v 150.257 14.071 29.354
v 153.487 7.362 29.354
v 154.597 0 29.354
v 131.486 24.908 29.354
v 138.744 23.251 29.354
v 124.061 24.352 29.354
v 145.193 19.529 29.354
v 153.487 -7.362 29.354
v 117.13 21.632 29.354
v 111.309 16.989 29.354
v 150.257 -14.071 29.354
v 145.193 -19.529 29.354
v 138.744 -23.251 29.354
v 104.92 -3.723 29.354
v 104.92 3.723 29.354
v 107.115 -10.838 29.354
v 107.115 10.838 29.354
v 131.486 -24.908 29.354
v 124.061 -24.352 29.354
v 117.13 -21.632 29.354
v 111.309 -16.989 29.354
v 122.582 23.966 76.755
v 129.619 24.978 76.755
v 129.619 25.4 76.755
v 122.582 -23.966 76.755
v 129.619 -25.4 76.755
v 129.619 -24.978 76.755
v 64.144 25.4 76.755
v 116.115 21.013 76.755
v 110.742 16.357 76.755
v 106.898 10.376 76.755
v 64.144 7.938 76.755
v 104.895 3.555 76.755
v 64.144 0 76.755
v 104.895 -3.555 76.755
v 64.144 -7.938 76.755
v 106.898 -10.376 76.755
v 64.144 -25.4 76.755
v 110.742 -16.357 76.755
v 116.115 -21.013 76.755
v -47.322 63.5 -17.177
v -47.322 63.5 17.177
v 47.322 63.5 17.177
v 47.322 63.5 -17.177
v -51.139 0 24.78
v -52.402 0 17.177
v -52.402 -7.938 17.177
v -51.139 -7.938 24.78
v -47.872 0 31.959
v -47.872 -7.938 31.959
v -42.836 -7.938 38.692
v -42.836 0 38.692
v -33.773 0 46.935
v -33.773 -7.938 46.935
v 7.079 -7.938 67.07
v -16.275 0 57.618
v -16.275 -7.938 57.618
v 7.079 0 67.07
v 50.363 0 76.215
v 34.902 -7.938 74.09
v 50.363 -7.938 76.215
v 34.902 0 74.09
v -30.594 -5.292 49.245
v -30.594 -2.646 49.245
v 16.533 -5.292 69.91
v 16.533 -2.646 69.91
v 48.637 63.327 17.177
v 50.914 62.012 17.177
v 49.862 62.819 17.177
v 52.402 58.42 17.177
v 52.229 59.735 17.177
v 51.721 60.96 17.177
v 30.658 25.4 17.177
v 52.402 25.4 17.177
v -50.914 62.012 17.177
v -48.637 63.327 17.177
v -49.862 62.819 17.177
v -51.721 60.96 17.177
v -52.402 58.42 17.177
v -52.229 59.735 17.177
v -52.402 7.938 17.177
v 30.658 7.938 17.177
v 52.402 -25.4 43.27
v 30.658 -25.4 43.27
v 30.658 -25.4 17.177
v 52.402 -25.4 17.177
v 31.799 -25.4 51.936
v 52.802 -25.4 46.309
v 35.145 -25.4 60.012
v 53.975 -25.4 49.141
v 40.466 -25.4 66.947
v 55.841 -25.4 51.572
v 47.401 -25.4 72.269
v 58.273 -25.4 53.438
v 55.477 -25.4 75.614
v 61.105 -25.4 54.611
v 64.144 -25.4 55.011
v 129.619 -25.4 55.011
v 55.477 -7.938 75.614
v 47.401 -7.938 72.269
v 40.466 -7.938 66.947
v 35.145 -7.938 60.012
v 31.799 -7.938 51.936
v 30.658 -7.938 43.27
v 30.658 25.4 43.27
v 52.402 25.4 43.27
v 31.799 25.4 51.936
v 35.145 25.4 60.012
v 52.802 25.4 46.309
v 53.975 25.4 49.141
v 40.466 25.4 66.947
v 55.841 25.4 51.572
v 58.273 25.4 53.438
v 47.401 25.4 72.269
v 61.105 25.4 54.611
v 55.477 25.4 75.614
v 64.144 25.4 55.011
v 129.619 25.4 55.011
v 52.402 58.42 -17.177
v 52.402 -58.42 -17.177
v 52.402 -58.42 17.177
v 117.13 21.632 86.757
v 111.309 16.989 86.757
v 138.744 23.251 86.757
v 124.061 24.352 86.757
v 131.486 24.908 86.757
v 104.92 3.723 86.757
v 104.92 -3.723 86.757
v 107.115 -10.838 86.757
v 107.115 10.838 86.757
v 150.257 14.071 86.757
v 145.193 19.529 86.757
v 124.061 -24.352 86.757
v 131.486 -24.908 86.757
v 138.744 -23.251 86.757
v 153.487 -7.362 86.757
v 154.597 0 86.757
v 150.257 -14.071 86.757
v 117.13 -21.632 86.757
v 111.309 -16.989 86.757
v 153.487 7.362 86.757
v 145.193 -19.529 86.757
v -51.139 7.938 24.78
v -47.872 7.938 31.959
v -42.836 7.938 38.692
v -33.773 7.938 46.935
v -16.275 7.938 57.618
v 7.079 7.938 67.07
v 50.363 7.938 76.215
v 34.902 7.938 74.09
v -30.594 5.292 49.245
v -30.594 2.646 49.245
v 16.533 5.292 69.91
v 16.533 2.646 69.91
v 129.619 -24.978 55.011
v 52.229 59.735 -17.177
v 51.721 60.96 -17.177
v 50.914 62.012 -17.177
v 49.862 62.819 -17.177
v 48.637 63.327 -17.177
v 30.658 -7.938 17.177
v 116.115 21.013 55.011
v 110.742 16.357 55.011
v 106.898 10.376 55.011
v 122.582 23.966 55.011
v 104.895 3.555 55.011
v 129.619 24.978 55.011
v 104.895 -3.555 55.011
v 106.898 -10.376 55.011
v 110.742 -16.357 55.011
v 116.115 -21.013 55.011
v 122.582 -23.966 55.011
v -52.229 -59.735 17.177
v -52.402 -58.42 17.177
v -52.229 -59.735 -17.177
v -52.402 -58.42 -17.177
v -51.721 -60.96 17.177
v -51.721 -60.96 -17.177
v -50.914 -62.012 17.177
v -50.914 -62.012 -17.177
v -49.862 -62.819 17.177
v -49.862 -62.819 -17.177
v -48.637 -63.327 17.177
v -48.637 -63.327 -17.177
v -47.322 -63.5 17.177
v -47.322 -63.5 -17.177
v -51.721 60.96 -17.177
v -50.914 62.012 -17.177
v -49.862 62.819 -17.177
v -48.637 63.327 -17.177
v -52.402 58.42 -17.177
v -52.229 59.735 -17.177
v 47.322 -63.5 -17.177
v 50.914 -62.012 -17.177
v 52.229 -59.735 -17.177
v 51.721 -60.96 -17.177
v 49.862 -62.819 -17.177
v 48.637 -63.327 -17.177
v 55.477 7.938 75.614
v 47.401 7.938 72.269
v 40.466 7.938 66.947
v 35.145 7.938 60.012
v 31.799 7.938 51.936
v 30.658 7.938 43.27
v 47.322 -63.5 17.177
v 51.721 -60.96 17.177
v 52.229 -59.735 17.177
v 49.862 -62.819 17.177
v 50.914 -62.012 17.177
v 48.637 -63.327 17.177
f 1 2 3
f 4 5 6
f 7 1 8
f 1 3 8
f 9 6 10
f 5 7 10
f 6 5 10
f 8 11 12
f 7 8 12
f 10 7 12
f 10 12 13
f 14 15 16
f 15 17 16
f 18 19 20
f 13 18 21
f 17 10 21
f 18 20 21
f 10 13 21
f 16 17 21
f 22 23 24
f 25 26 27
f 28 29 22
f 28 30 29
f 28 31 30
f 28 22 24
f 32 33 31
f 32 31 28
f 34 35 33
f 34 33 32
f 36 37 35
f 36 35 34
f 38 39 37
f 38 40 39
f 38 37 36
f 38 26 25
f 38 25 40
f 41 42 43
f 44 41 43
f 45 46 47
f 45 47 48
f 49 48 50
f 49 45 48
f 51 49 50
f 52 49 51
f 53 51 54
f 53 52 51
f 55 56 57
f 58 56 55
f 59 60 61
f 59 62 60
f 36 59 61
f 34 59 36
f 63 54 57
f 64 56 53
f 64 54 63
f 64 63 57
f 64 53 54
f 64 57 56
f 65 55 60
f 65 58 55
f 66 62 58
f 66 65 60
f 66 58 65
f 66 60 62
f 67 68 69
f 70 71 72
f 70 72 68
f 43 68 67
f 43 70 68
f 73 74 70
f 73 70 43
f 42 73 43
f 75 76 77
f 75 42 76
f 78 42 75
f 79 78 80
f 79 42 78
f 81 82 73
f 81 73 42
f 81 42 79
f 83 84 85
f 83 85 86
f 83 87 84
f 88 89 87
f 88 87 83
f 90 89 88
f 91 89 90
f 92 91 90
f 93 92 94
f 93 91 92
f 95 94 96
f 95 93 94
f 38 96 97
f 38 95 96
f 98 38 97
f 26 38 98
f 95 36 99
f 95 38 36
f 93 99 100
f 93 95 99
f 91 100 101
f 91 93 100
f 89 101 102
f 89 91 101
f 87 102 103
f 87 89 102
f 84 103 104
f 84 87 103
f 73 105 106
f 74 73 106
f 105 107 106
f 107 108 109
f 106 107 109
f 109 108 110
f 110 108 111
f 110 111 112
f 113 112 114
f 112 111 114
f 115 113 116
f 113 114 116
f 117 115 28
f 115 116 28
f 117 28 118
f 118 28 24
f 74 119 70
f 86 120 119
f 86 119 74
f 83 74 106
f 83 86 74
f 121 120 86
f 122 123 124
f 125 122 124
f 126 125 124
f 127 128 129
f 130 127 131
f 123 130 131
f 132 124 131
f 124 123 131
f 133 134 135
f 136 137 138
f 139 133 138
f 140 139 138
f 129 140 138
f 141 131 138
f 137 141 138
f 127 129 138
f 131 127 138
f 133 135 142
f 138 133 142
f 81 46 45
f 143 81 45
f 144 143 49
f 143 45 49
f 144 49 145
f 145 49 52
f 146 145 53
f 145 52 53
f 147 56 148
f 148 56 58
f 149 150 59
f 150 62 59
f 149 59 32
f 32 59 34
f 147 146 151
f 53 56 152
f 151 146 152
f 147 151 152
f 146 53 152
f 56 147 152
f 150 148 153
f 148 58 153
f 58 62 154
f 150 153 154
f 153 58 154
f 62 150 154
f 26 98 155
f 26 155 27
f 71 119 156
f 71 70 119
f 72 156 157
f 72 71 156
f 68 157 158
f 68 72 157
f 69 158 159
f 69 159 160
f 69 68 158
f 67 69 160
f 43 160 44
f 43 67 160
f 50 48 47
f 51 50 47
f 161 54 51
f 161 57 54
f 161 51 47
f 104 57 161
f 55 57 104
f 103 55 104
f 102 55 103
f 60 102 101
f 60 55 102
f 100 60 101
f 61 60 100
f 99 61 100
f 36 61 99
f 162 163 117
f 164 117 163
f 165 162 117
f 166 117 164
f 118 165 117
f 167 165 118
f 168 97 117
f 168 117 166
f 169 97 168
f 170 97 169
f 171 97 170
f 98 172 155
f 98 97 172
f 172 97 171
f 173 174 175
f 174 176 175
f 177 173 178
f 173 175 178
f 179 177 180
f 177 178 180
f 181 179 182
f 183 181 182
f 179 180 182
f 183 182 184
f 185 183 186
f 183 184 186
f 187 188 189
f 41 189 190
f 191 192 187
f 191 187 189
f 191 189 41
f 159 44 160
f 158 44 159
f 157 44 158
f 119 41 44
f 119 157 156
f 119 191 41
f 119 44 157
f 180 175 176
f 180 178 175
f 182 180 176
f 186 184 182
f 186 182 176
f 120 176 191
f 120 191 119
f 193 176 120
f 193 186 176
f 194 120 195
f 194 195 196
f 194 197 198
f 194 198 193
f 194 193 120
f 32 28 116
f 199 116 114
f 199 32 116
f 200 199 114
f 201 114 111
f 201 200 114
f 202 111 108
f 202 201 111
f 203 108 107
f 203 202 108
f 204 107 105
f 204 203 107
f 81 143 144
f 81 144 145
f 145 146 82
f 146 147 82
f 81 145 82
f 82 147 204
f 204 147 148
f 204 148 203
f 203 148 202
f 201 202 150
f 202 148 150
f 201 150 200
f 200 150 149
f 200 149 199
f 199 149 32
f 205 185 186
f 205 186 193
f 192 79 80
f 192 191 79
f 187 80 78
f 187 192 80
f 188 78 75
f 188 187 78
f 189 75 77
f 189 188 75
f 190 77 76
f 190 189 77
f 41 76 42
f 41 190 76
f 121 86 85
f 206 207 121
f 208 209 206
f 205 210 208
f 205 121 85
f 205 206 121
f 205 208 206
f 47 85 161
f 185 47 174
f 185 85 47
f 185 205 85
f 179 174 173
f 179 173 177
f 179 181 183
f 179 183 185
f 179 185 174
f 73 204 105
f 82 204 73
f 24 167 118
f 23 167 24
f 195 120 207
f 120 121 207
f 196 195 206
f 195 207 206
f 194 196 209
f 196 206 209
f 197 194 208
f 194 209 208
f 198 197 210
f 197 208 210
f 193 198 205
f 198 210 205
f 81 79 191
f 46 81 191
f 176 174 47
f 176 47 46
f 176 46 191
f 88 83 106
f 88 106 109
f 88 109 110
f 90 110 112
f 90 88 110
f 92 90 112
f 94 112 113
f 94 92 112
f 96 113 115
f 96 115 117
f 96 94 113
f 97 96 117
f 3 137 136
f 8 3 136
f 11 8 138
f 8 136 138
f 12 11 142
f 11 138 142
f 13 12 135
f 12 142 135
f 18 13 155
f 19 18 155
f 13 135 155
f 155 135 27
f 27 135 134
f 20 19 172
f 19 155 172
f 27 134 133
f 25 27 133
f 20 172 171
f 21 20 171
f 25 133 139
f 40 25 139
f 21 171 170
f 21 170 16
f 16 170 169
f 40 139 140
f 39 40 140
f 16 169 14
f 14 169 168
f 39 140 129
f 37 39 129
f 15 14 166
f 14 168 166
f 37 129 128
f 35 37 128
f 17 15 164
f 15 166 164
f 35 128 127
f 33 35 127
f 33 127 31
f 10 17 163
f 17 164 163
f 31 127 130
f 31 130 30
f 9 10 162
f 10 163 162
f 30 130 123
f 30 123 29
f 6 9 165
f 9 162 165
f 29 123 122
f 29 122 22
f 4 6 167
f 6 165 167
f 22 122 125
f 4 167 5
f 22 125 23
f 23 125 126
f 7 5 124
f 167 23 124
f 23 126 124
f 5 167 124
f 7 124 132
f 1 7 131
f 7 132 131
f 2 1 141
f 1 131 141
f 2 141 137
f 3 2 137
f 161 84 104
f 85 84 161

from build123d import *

# Parameters (mm, degrees)
F1_DEPTH = 63.5
F0_W     = 25.4670892687
F0_H     = 21.7436235398
F2_DEPTH = 25.4
F3_DEPTH = 7.9375
F5_R     = 5.08


with BuildPart() as f1:
    # F0 (on Front) → F1 (new body, symmetric)
    with BuildSketch(Plane.XZ):
        Polygon((52.4020902812, -17.1774495393), (52.4020902812, 17.1774495393), (30.6584667414, 17.1774495393), (-52.4020902812, 17.1774495393), (-52.4020902812, -17.1774495393), align=None)
    extrude(amount=F1_DEPTH, both=True)

    # F0 (on Front) → F2 (join, symmetric)
    with BuildSketch(Plane.XZ):
        with BuildLine():
            Line((30.6584667414, 17.1774495393), (52.4020902812, 17.1774495393))
            Line((52.4020902812, 17.1774495393), (52.4020902812, 43.2697720826))
            ThreePointArc((52.4020902812, 43.2697720826), (55.8411102963, 51.5723008442), (64.1436390579, 55.0113208592))
            Line((64.1436390579, 55.0113208592), (104.1518747807, 55.0113208592))
            Line((104.1518747807, 55.0113208592), (104.1518747807, 76.754944399))
            Line((104.1518747807, 76.754944399), (64.1436390579, 76.754944399))
            ThreePointArc((64.1436390579, 76.754944399), (40.4660466437, 66.9473644967), (30.6584667414, 43.2697720826))
            Line((30.6584667414, 43.2697720826), (30.6584667414, 17.1774495393))
        make_face()
        with Locations((116.885419415, 65.8831326291)):
            Rectangle(F0_W, F0_H)
    extrude(amount=F2_DEPTH, both=True)

    # F0 (on Front) → F3 (join, symmetric)
    with BuildSketch(Plane.XZ):
        with BuildLine():
            Line((-52.4020902812, 17.1774495393), (30.6584667414, 17.1774495393))
            Line((30.6584667414, 17.1774495393), (30.6584667414, 43.2697720826))
            ThreePointArc((30.6584667414, 43.2697720826), (40.4660466437, 66.9473644967), (64.1436390579, 76.754944399))
            add(Edge.make_bspline(
                [(-52.4020902812, 17.1774495393), (-51.5323504806, 54.1415736079), (24.5702583343, 77.6246711612), (64.1436390579, 76.754944399)],
                knots=[0, 0, 0, 0, 130.8907365743, 130.8907365743, 130.8907365743, 130.8907365743], degree=3))
        make_face()
    extrude(amount=F3_DEPTH, both=True)

    # F0 (on Front) → F4 (revolve)
    with BuildSketch(Plane.XZ):
        Polygon((129.6189640493, 76.754944399), (129.6189640493, 55.0113208592), (129.6189640493, 29.353864491), (154.5970141888, 29.353864491), (154.5970141888, 86.7569819093), (129.6189640493, 86.7569819093), align=None)
    revolve(axis=Axis((129.6189640493, 0, 58.0554232001), (0, 0, -1)))

    # F5
    f5_edges = [f1.edges().sort_by_distance(p)[0] for p in [
        (-52.40209, -63.5, 0),
        (52.40209, -63.5, 0),
        (52.40209, 63.5, 0),
        (-52.40209, 63.5, 0),
    ]]
    fillet(f5_edges, radius=F5_R)


solid = f1.part
